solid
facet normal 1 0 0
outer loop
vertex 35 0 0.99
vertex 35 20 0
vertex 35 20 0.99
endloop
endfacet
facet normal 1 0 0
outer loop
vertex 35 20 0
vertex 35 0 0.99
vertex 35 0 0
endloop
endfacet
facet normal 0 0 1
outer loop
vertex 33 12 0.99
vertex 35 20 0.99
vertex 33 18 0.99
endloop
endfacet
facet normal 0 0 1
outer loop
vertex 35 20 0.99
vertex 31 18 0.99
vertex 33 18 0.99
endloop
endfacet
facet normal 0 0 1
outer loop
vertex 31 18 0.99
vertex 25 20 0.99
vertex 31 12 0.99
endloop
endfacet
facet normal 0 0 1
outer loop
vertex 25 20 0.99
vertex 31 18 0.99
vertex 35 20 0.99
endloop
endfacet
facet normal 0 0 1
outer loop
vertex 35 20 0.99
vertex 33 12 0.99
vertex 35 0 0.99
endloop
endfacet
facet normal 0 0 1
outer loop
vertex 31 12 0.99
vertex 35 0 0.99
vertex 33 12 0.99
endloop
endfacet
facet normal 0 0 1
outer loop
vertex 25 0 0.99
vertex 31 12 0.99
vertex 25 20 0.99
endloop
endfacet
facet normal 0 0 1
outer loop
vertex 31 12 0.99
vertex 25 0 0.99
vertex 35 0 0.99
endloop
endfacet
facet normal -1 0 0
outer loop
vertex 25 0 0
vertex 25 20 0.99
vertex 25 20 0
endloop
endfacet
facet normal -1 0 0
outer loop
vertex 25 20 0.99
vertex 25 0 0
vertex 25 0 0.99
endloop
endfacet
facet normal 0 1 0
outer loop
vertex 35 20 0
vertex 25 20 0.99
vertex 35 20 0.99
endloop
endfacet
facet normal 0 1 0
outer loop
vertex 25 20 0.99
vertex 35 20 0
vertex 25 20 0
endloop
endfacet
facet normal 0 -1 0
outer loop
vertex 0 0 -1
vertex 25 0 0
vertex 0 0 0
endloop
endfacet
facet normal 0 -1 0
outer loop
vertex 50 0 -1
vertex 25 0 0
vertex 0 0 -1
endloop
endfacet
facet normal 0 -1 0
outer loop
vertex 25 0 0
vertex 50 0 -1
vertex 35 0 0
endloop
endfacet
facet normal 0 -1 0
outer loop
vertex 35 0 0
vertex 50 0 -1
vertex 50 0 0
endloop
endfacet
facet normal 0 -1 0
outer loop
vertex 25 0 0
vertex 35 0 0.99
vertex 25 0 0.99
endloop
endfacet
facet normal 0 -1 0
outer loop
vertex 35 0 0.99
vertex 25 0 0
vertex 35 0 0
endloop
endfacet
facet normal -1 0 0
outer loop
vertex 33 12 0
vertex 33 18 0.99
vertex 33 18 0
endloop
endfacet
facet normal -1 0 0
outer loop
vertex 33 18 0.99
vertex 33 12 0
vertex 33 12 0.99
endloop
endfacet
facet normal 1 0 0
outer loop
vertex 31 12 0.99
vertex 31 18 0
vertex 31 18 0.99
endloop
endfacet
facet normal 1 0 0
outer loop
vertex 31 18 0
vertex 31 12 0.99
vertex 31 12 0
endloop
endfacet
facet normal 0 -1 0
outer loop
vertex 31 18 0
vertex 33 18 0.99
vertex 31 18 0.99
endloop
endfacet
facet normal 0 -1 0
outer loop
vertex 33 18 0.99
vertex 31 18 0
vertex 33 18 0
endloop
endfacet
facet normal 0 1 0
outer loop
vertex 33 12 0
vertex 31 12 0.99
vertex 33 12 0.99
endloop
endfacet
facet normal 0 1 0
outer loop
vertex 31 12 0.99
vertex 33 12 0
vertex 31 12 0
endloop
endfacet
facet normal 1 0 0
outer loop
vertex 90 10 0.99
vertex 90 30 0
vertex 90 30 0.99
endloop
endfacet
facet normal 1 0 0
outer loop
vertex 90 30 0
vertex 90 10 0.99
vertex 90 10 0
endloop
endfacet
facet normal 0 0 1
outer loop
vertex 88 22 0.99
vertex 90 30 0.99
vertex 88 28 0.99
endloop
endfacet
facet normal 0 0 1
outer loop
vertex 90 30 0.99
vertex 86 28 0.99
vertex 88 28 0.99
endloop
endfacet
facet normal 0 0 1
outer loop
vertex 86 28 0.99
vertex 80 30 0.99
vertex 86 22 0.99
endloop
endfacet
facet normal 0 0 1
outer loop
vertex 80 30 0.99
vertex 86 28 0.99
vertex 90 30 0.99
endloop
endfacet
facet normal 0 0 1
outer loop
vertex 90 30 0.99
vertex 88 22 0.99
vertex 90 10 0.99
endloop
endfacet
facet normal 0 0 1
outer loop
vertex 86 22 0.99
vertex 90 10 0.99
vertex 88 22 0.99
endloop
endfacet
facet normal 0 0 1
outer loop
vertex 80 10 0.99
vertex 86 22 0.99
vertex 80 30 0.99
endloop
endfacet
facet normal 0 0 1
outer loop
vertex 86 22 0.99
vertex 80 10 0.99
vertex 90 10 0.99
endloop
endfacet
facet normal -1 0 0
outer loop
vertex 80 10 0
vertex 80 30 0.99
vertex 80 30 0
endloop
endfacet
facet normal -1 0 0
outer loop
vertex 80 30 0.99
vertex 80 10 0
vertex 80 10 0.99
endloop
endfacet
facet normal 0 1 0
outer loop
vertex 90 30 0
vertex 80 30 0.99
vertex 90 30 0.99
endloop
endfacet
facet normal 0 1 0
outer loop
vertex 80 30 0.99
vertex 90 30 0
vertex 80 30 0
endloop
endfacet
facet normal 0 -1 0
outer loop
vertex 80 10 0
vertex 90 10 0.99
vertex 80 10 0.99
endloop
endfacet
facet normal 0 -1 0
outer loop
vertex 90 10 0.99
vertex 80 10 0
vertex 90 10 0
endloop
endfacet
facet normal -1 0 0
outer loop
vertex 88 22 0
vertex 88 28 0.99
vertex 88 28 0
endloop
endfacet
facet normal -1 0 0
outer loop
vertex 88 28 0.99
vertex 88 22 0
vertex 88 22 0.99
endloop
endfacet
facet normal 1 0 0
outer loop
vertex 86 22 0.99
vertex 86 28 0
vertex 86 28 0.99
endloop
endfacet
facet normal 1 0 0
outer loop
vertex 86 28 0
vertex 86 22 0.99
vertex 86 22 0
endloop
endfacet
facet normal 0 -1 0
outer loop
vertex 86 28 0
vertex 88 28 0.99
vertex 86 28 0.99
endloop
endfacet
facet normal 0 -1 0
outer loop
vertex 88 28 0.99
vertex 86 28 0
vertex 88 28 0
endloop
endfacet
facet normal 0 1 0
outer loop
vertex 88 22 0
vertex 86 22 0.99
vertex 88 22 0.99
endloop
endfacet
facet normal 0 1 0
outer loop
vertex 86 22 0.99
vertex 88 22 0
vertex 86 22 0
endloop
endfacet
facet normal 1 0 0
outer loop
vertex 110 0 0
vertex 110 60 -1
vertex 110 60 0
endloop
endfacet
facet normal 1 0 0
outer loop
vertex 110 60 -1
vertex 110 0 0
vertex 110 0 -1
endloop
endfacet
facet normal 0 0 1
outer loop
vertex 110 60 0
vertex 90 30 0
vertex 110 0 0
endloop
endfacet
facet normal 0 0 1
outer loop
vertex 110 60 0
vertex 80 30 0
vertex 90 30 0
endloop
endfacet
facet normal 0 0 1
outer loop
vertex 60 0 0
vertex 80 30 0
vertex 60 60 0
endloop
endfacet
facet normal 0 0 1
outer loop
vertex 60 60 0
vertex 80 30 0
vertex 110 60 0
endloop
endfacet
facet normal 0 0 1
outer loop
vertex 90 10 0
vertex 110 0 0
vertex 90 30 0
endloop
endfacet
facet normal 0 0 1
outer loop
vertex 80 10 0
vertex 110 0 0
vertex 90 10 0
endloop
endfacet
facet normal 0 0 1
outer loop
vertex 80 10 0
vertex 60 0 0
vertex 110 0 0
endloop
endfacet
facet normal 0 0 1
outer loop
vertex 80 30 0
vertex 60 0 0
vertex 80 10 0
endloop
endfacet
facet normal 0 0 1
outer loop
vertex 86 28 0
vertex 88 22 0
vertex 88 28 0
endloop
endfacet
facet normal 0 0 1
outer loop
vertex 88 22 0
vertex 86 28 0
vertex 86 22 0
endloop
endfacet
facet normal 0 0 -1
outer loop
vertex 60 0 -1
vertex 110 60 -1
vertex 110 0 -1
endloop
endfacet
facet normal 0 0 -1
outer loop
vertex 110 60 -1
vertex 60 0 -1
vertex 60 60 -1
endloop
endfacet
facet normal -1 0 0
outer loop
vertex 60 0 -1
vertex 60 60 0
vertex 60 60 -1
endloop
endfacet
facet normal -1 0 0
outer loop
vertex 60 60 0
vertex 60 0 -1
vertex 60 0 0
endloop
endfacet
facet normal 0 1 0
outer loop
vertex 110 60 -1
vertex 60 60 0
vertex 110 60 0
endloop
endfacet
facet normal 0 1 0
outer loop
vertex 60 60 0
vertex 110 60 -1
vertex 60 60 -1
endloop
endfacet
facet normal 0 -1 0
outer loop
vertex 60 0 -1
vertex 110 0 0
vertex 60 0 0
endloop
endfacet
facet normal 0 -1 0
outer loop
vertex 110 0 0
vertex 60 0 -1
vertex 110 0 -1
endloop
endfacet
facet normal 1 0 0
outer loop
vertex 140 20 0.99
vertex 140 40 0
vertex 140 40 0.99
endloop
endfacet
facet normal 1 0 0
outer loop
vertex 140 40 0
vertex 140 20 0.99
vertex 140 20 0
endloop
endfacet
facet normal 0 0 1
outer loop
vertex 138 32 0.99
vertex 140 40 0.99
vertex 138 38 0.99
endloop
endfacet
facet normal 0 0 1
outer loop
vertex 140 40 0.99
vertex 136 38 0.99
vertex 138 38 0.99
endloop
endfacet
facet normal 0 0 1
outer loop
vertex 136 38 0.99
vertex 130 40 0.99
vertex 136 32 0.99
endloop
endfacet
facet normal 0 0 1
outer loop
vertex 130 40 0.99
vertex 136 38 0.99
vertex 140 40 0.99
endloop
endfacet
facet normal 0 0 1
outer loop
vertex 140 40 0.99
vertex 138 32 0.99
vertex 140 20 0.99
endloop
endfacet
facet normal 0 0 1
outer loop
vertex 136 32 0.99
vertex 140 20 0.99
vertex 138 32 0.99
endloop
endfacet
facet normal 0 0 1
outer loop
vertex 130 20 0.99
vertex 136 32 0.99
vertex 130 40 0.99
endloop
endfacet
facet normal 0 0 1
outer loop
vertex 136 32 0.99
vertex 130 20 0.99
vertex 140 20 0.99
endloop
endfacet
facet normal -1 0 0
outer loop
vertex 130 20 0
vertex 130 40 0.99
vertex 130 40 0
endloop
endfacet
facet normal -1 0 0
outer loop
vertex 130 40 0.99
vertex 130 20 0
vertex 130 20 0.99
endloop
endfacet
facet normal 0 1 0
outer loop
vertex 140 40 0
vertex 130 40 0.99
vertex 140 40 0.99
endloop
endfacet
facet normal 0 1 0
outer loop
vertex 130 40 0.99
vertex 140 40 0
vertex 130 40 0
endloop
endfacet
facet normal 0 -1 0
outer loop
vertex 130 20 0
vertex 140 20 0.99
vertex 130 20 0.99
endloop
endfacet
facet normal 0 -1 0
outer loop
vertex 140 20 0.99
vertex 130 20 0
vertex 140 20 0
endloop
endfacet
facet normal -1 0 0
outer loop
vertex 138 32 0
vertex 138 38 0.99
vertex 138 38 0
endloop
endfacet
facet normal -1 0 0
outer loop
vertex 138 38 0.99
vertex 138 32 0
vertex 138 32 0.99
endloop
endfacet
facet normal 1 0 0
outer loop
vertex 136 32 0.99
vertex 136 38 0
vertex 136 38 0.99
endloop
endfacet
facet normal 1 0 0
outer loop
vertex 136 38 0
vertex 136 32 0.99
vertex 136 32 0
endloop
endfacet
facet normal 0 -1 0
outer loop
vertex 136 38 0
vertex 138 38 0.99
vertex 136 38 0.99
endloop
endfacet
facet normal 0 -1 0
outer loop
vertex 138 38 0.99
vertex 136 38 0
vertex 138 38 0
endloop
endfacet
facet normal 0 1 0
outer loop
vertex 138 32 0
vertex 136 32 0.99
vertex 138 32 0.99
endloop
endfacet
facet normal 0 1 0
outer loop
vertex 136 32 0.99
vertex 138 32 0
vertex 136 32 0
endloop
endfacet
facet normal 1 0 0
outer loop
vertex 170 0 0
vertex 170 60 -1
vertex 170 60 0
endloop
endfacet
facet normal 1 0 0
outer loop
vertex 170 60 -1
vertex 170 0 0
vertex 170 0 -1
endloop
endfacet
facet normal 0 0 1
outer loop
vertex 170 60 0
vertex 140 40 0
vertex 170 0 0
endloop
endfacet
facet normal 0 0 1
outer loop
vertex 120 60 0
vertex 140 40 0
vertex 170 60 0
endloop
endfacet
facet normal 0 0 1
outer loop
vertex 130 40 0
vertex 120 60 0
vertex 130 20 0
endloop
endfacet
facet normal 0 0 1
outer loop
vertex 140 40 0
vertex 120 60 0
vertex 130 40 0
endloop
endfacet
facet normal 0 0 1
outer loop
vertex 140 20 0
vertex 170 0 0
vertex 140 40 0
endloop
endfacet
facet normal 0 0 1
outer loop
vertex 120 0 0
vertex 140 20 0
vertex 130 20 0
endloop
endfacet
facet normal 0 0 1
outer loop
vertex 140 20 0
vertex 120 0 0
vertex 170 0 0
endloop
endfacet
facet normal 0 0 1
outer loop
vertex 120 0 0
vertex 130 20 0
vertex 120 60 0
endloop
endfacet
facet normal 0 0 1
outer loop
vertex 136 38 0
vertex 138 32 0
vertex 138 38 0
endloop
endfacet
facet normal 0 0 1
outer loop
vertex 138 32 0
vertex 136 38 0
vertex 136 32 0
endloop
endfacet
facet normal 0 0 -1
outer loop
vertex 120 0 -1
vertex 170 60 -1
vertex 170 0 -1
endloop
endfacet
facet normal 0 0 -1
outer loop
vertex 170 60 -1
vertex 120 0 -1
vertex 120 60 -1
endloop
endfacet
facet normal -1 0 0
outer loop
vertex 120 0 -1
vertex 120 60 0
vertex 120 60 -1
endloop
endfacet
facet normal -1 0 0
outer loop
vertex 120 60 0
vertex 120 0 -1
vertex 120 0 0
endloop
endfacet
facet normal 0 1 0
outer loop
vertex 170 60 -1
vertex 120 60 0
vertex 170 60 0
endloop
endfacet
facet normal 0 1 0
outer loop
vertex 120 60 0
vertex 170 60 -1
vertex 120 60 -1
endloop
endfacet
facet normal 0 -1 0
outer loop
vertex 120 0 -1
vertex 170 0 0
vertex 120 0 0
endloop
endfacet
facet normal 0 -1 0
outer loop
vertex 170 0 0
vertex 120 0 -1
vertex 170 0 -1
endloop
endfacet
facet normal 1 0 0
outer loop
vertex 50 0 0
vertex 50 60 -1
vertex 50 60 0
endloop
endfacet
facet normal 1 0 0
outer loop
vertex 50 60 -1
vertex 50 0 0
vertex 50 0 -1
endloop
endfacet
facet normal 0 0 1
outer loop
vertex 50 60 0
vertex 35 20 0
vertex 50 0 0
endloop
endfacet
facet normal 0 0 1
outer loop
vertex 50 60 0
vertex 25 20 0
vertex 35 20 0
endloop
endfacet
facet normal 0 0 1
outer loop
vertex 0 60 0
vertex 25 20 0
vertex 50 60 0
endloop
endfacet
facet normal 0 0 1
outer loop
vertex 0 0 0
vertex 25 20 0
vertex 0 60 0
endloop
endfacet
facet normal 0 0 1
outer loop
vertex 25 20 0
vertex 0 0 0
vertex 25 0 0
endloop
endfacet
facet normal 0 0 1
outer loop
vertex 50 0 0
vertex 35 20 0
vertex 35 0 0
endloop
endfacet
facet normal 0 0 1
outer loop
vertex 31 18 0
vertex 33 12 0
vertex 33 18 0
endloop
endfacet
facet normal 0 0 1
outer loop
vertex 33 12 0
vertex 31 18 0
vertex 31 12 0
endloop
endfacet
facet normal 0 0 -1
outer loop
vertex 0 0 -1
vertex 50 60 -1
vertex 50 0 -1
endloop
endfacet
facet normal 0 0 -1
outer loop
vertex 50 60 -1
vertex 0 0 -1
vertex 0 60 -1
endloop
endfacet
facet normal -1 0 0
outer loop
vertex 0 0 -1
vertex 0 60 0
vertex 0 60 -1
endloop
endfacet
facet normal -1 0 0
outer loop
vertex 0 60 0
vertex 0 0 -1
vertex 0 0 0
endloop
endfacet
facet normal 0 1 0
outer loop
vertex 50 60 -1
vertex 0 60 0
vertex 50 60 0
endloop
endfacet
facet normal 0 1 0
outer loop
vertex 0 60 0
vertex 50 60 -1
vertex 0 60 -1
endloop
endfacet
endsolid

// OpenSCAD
// file: ../../Base/PlacementOptions.scad
// Fischertechnik Box Foundation
// Placement Options

// Alignment
NoAlign = 0;
AlignLeft = 1;
AlignBottom = 2;
AlignCenter = 3;
AlignRight = 4;
AlignTop = 5;

// Element rotation degree steps
rotations = [0, -90, -180, -270];

// Rotation
NoRotation = 0;
Rotate0 = 0;
Rotate90 = 1;
Rotate180 = 2;
Rotate270 = 3;

// Docking (seen from above)
NoDock = -1;
DockLeft = 0;
DockTop = 1;
DockRight = 2;
DockCorner = 2;
DockBottom = 3;

// Web corners
LowerLeft = 0;
UpperLeft = 1;
UpperRight = 2;
LowerRight = 3;

// Web position relative to corner
LeftOfCorner = 0;
RightOfCorner = 1;
// file: ../../Base/Boxes.scad
// Fischertechnik Box Foundation
// Pre-designed Boxes

use <Constants.scad>

include <PlacementOptions.scad>

box190Width = 190;
box190Depth = 130;
box130Width = 130;
box130Depth = 95;
boxUsageHeight = 33.9;
boxWallThickness = 2.4;
boxBaseThickness = 1.0;
boxWebWidth = 3.0;

// getBoxWallThickness()
// Gets the wall thickness of a Fischertechnik Box

function getBoxWallThickness() = boxWallThickness;

// Gets the usable height of a fischertechnik box
function getBoxUsageHeight() = boxUsageHeight;

// Gets the thickness of the Fischertechnik box base.
function getBoxBaseThickness() = boxBaseThickness;

// Gets the width of a box web
function getBoxWebWidth() = boxWebWidth;

// Gets the usable inner space of a Box 190 as an x/y-list
function getBox190Space() = [
    box190Width - 2*getBoxWallThickness(), 
    box190Depth - 2*getBoxWallThickness() ];

// Imports the Fischertechnik empty box 130x190 mm and places it at position 0,0
// 190x130 are the outer sizes, the inner space is slightly smaller. Use getBox190Space() to get the inner sizes.
// This module needs the STL file "Fischertechnik Box 130x190.stl" in the library path.
// The box is positioned that the usable inner space is at the 0,0,0 position. The

module Box190() {
    translate([-getBoxWallThickness(),-getBoxWallThickness(),-getBoxBaseThickness()])
        import("Fischertechnik Box 130x190.stl", convexity=3);
}

// Gets the usable inner space of a Box 130 as an x/y-list
function getBox130Space() = [
    box130Width - 2*getBoxWallThickness(), 
    box130Depth - 2*getBoxWallThickness() ];

// Imports the Fischertechnik empty box 95x130 mm and places it at position 0,0
// 190x130 are the outer sizes, the inner space is slightly smaller. Use getBox190Space() to get the inner sizes.
// This module needs the STL file "Fischertechnik Box 95x130.stl" in the library path.
// The box is positioned that the usable inner space is at the 0,0,0 position. The

module Box130() {
    translate([-getBoxWallThickness(),-getBoxWallThickness(),-getBoxBaseThickness()])
        import("Fischertechnik Box 95x130.stl", convexity=3);
}

// Creates a web at the specified box walls
// corner 0 = LowerLeft, 1 = UpperLeft, 2 = UpperRight, 3 = LowerRight
// side 0 = LeftOfCorner, 1 = RightOfCorner
// distance = Distance in mm from the corner
// box = inner width and depth of the box (default: Box 190)
// webWidth = length of the web (default is 3 mms)
// webThickness = thickness of the web (default is 1 mm)

module BoxWeb(corner, side, distance, box=getBox190Space(), webWidth=getBoxWebWidth(), webThickness=1.0) {
    sink = getBoxWallThickness()/2;

    width = (corner % 2 == 0) ? 
            (side == LeftOfCorner ? webWidth : webThickness) :
            (side == LeftOfCorner ? webThickness : webWidth);

    depth = (corner % 2 == 0) ? 
            (side == RightOfCorner ? webWidth : webThickness) :
            (side == RightOfCorner ? webThickness : webWidth);
    
    xDiff = corner == LowerLeft ? 
                (side == LeftOfCorner ? -sink : distance) :
            (corner == UpperLeft ?                
                (side == LeftOfCorner ? distance : -sink) :
            (corner == UpperRight ?
                (side == LeftOfCorner ? box.x-webWidth+sink : box.x-distance-webThickness) :
                (side == LeftOfCorner ? box.x-distance-webThickness: box.x-webWidth+sink)));

    yDiff = corner == LowerLeft ? 
                (side == RightOfCorner ? -sink : distance) :
            (corner == UpperLeft ?
                (side == RightOfCorner ? box.y-distance : box.y-webWidth+sink) :
            (corner == UpperRight ?
                (side == RightOfCorner ? box.y-webWidth+sink : box.y-distance) :
                (side == RightOfCorner ? distance : -sink)));
    
    translate([xDiff, yDiff, -getExcess()])
        cube([width, depth, boxUsageHeight + 2*getExcess()]);
}
// file: ../../Base/Rotation.scad
// Fischertechnik Box Foundation
// Geometry Helpers Rotation

include <PlacementOptions.scad>

// getRotatedSpace(space, rotation=NoRotation)
// Rotates the space dependent on the specified rotation

function getRotatedSpace(space, rotation=NoRotation) = [
    (rotation == Rotate90 || rotation == Rotate270) ? space.y : space.x,
    (rotation == Rotate90 || rotation == Rotate270) ? space.x : space.y
];

// Rotates the given space around the fixed left lower corner
// space = the space the children needs as width/depth list [width,depth]
// rotation = 0 Rotate0 degrees, 1 Rotate90 degrees, 2 Rotate180 degrees, 3 Rotate270 degrees (equivalent to -90)

module RotateFix(space, rotation=Rotate0) {
    dy = (rotation == Rotate0 || rotation == Rotate270) ? 0 :
        (rotation == Rotate90) ? space.x :
        space.y;
    dx = (rotation < Rotate180) ? 0 :
        (rotation == Rotate180) ? space.x :
        space.y;
    
    translate([dx, dy, 0])
        rotate([0, 0, rotations[rotation]])
            children();
}
// file: ../../Base/Alignment.scad
// Fischertechnik Box Foundation
// Geometry Helpers Alignment

include <PlacementOptions.scad>

// getAlignedX(elementWidth, spaceWidth, align=AlignRight, offset=0)
// Gets the aligned X offset of an element with the given
// width in the given space.
// elementWidth = The width of the element to positon
// spaceWidth = The space where the element should be aligned
// align = 0 AlignLeft, 1 AlignCenter, 2 AlignRight
// offset = an optional offset from the aligned position. When
// aligned left or centered, then positive values are in X direction.
// When aligned right then positive values are in negative X direction.

function getAlignedX(elementWidth, spaceWidth, align=AlignRight, offset=0) =
    (align == AlignLeft) ?
        offset :
        ((align == AlignCenter) ?
        (spaceWidth - elementWidth)/2 + offset :
        spaceWidth - offset - elementWidth);

// getAlignedY(elementDepth, spaceDepth, align=AlignTop, offset=0)
// Gets the aligned Y offset of an element with the given
// depth in the given space.
// elementDepth = The depth of the element to positon
// spaceDepth = The space where the element should be aligned
// align = 0 AlignBottom, 1 AlignCenter, 2 AlignTop
// offset = an optional offset from the aligned position. When
// aligned bottom or centered, then positive values are in Y direction.
// When aligned top then positive values are in negative Y direction.

function getAlignedY(elementDepth, spaceDepth, align=AlignTop, offset=0) =
    (align == AlignBottom) ?
        offset :
        ((align == AlignCenter) ?
        (spaceDepth - elementDepth)/2 + offset :
        spaceDepth - offset - elementDepth);
// file: ../../Base/Constants.scad
// Fischertechnik Box Foundation
// Constants

// Constant values necessary for multiple elements

// Base constants
dividerThickness = 1.2;
excess = 0.01;
fragments = 90;
tolerance = 0.8;

// Gets the thickness of a divider 
function getDividerThickness() = dividerThickness;

// Gets the excess that is used to merge walls into each other
function getExcess() = excess;

// Gets amount of fragments of a cylinder
function getFragments() = fragments;

// Gets the inner tolerance of a frame to each side
function getTolerance() = tolerance;


// Fischertechnik specific constants
axisDiameter = 4;
axisBottomDiameter = axisDiameter + 1;
standardEdgeDistance = 2.5;
standardWebDistance = 11.5;
standardCornerLength = 15;
tubeWallFactor = 0.8;
smallPartsFrameHeight = 20;

// Gets axis diameter
function getAxisDiameter() = axisDiameter;

// Gets axis bottom diameter for thicker part at the bottom
function getAxisBottomDiameter() = axisBottomDiameter;

// gets the standard distance to the wall of the box for dockable frames with webs
function getStandardEdgeDistance() = standardEdgeDistance;

// gets the standard distance of each web to the corner of the dockable frame
function getStandardWebDistance() = standardWebDistance;

// gets the standard length of the corner walls of a dockable frame
function getStandardCornerLength() = standardCornerLength;

// gets the wall thickness of a tube.
function getTubeWallThickness() = tubeWallFactor * getDividerThickness();

// gets the frame height for docked small parts boxes.
function getSmallPartsFrameHeight() = smallPartsFrameHeight;
// file: ../TestHelper.scad
// Fischertechnik Box Foundation
// Test Helper

function getPlacementBaseSpace() = [50,60];
function getCubeSpace() = [10,20];

module PlacementBase() {
    color("green")
    translate([0, 0, -1])
        cube([getPlacementBaseSpace().x, getPlacementBaseSpace().y, 1]);
}

module Cube() {
    translate([0,0,-.01])
    difference() {
        cube([getCubeSpace().x,getCubeSpace().y,1]);
        translate([getCubeSpace().x*0.6, getCubeSpace().y*0.6, -1])
            cube([getCubeSpace().x*0.2,getCubeSpace().y*0.3,3]);
    }
}

module Deploy(distance=30) {
    for( i = [0:1:$children-1])
        translate([i*distance, 0])
            children(i);
}
// file: ../../Base/Placement.scad
// Fischertechnik Box Foundation
// Geometry Helpers Placement

use <Constants.scad>
use <Alignment.scad>
use <Rotation.scad>
use <Boxes.scad>

include <PlacementOptions.scad>

// Place(x=0, y=0, elementSpace=[0,0], alignX=AlignLeft, alignY=AlignBottom, rotation=Rotate0, boxSpace=getBox190Space())
// Places the child at the specified position
// y = Y-Position. This is a relative position when an X aligment is specified.
// x = X-Position. This is a relative position when an Y aligment is specified.
// elementSpace = space of the element to be placed [x,y]
// alignX = -1=NoAlign, 0 AlignLeft, 1 AlignCenter, 3 AlignRight (elementSpace and boxSpace required!)
// alignY = -1=NoAlign, 2 AlignBottom, 1 AlignCenter, 4 AlignTop (elementSpace and boxSpace required!)
// rotation = 0 Rotate0 0 degrees, 1 Rotate90 90 degrees, 
// 2 Rotate180 180 degrees, 3 Rotate270 270 degrees (equivalent to -90)
// boxSpace = Inner space of the box where the placement occurs [x,y] - default is Box 190x130 inner space

module Place(x=0, y=0, elementSpace=[0,0], 
  alignX=AlignLeft, alignY=AlignBottom, 
  rotation=NoRotation, boxSpace=getBox190Space()) {

    module Position(x, y, space, rotation=Rotate0) {
        translate([x, y, 0])
            RotateFix(space, rotation)
                children();
    }

    space = getRotatedSpace(elementSpace, rotation);
    alignedX = getAlignedX(space.x, boxSpace.x, alignX, x);
    alignedY = getAlignedY(space.y, boxSpace.y, alignY, y);
    Position(alignedX, alignedY, elementSpace, rotation)
        children();
}

// Center(space=getBox130Space(), elementSpace=[0,0])
// space = Space where the children is centered. For cylinder use centered=true and no elementSpace.
// elementSpace = space of the element to be centered [x,y]

module Center(space=getBox190Space(), elementSpace=[0,0]) {
    Place(elementSpace=elementSpace, boxSpace=space, alignX=AlignCenter, alignY=AlignCenter)
        children();
}

// CenterHorizontal(width=0, y=0, offset=0, space=getBox130Space())
// width = Width of the element to be placed.
// y = Y position of the element
// offset = Offset from the center position (negative will be left of the center)
// space = Space where the element is placed

module CenterHorizontal(width=0, y=0, offset=0, space=getBox190Space()) {
    Place(x=offset, y=y, elementSpace=[width, 0], boxSpace=space, alignX=AlignCenter)
        children(0);
}

// CenterVertical(depth=0, x=0, offset=0, space=getBox130Space())
// depth = Depth of the element to be placed.
// x = X position of the element
// offset = Offset from the center position (negative will be down of the center)
// space = Space where the element is placed

module CenterVertical(depth=0, x=0, offset=0, space=getBox190Space()) {
    Place(x=x, y=offset, elementSpace=[0, depth], boxSpace=space, alignY=AlignCenter)
        children(0);
}

// getIsVertical(align)
// True if the specified alignment needs a vertical orientation for a divider (AlignRight, AlignLeft)

function getIsVertical(align) = (align == AlignRight || align == AlignLeft);

// getIsHorizontal(align)
// True if the specified alignment needs a horizontal orientation for a divider (AlignTop, AlignBottom)

function getIsHorizontal(align) = (align == AlignTop || align == AlignBottom);
// main file
// Fischertechnik Box Foundation
// Geometry Helpers Placement
// Test CenterHorizontal

use <../../Base/Placement.scad>

use <../TestHelper.scad>

PlacementBase();

CenterHorizontal(space=getPlacementBaseSpace())
    Cube();

translate([60, 0]) {
    PlacementBase();
    CenterHorizontal(width=getCubeSpace().x, y=10, space=getPlacementBaseSpace())
        Cube();
}

translate([120, 0]) {
    PlacementBase();
    CenterHorizontal(width=getCubeSpace().x, y=20, offset=-10, space=getPlacementBaseSpace())
        Cube();
}
